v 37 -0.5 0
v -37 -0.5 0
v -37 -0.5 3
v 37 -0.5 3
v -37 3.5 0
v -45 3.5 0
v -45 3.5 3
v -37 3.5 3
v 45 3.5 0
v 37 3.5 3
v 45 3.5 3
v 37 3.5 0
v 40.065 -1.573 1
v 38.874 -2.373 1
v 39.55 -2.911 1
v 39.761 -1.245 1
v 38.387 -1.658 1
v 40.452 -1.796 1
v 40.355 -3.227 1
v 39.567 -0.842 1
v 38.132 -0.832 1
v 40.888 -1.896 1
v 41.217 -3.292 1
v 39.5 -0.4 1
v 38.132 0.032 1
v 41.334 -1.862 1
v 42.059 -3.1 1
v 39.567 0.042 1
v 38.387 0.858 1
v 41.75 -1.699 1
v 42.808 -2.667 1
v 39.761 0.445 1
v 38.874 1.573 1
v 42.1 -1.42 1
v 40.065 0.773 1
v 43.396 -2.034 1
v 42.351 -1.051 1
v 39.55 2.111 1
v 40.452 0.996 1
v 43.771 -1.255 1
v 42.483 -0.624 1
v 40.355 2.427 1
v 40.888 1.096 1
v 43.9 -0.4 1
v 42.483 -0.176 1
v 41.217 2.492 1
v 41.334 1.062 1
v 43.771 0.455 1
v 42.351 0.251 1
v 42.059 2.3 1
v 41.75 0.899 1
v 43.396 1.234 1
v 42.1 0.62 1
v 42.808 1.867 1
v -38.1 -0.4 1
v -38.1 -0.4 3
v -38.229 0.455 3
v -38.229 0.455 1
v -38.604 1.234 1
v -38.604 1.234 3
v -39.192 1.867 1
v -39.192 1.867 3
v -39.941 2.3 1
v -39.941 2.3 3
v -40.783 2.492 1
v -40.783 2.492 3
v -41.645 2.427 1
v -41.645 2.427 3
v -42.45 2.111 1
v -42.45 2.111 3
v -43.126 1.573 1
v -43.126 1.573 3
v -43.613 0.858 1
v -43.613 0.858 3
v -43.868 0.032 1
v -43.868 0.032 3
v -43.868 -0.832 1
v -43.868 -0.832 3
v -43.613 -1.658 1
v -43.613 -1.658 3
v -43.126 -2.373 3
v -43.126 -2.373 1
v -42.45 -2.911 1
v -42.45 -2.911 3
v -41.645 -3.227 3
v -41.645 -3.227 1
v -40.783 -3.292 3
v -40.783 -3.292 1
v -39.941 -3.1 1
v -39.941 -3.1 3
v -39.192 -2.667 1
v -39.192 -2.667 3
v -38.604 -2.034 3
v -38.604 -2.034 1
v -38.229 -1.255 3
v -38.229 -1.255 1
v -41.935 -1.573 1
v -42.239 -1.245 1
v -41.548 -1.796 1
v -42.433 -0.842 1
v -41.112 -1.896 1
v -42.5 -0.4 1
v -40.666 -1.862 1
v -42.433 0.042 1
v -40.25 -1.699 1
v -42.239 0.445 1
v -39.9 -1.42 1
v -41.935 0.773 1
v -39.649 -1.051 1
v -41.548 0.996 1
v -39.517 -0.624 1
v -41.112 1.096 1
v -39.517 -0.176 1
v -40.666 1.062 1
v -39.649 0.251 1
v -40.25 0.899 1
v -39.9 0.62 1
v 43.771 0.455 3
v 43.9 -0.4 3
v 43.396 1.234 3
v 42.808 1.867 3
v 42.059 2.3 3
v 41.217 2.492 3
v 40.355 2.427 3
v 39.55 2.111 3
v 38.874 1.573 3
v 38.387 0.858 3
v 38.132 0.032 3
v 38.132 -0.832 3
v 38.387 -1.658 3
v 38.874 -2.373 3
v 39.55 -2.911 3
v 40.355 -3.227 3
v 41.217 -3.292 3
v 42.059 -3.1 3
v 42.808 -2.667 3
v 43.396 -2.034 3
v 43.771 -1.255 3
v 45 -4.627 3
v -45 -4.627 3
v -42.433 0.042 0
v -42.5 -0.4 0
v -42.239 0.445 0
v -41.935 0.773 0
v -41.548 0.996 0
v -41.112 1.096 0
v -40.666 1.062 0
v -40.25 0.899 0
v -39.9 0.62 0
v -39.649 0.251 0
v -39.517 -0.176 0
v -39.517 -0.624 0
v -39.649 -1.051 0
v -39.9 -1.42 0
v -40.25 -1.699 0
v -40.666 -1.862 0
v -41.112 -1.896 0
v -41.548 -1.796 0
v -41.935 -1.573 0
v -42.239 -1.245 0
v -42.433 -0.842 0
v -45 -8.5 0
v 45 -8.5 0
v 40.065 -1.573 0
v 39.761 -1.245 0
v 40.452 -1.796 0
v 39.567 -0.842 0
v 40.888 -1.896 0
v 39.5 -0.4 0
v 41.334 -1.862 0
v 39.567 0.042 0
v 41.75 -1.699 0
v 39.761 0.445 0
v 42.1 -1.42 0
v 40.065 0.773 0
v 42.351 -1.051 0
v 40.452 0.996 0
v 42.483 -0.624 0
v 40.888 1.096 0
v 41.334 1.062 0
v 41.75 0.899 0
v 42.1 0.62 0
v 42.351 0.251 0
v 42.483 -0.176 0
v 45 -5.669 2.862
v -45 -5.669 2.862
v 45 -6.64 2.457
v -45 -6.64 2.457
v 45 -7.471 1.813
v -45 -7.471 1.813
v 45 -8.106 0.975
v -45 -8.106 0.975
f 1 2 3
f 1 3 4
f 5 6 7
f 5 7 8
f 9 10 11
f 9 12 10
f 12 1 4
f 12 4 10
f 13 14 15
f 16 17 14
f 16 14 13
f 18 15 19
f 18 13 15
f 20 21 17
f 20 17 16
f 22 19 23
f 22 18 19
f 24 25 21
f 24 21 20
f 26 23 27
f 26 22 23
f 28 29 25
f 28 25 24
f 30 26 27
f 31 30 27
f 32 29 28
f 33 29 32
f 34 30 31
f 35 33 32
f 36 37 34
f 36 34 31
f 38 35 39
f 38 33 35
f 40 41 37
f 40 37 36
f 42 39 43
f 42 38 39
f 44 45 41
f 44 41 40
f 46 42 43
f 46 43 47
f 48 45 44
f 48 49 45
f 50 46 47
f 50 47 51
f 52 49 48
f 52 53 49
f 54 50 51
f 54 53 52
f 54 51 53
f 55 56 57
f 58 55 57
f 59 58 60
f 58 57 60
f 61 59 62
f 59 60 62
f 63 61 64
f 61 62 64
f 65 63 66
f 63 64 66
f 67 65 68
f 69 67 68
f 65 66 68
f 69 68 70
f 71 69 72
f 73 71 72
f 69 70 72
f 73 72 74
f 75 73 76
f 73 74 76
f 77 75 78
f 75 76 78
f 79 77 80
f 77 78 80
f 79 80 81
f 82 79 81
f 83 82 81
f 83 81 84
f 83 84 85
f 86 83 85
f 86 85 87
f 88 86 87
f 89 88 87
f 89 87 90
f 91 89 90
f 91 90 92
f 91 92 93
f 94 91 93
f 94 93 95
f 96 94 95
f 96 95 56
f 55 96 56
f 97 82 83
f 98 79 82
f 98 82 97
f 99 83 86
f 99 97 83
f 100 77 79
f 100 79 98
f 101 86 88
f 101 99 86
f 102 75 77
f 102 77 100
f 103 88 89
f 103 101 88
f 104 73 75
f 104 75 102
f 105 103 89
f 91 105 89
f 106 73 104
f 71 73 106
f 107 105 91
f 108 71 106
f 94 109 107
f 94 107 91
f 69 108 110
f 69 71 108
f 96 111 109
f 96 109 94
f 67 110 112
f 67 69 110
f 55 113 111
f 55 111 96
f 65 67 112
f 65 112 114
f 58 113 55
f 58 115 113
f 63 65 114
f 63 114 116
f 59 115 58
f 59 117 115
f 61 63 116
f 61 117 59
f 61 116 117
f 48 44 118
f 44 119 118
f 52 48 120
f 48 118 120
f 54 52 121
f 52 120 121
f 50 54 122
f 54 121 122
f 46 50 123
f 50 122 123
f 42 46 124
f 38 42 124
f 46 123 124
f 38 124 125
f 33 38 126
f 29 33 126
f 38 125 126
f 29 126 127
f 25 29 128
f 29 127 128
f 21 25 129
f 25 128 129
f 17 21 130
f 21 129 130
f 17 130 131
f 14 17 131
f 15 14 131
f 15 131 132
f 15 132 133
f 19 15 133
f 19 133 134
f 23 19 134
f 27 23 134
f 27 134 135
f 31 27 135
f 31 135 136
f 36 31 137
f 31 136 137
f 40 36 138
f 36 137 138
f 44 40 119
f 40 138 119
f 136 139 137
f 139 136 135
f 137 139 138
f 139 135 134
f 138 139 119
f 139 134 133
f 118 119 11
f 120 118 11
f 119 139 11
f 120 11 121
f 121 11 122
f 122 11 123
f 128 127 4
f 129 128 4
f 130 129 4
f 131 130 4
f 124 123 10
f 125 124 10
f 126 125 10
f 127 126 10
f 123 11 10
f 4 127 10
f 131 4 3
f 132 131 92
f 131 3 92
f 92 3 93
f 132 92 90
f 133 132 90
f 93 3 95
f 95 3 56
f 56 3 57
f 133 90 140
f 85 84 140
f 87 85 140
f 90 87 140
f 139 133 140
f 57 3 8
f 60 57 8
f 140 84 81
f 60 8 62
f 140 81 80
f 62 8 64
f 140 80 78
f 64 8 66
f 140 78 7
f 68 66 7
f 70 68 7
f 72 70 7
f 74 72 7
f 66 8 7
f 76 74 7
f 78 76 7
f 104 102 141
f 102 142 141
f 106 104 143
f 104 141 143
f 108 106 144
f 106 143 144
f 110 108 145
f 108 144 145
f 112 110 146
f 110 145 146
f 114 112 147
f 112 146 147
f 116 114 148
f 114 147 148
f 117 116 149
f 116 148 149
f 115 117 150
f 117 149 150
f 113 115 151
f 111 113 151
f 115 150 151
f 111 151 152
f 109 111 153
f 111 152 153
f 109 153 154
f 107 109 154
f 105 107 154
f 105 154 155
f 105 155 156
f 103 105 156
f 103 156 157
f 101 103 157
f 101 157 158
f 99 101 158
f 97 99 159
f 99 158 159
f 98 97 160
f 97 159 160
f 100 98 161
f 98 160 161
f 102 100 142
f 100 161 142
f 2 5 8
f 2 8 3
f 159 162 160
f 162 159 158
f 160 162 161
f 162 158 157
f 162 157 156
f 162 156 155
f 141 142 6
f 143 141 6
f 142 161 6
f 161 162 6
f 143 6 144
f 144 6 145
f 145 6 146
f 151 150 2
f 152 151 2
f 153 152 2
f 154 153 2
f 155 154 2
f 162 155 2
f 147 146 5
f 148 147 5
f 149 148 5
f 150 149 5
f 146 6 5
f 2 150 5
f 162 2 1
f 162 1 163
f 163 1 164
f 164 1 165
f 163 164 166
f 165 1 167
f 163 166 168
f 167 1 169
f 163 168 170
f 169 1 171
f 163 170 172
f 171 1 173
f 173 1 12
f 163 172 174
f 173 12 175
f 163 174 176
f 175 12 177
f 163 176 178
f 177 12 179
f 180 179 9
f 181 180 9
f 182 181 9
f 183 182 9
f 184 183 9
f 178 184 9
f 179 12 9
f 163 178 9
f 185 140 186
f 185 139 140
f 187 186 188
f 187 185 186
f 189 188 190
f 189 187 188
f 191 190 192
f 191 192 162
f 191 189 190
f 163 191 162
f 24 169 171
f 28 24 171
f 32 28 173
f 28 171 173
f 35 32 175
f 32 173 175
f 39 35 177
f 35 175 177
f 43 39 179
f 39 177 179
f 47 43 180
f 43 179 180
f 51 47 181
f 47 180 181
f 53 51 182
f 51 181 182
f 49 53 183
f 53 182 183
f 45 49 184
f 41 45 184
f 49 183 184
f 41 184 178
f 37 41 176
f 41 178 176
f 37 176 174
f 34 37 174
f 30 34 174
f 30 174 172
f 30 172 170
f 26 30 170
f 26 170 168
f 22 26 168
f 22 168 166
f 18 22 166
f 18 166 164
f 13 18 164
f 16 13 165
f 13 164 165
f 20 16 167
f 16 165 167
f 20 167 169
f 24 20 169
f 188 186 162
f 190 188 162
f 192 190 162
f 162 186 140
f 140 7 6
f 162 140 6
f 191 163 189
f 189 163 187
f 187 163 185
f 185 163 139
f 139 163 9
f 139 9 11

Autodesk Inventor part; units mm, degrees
ref_plane "YZ Plane" through (0, 0, 0) normal (1, 0, 0) x (0, 1, 0)
ref_plane "XZ Plane" through (0, 0, 0) normal (0, 1, 0) x (-1, 0, 0)
ref_plane "XY Plane" through (0, 0, 0) normal (0, 0, 1) x (1, 0, 0)
sketch "スケッチ1" plane through (0, 0, 0) normal (0, 0, 1) x (1, 0, 0)
  line L0 (-45, 3.5) -> (45, 3.5)
  line L1 (45, 3.5) -> (45, -3.5)
  line L2 (45, -3.5) -> (-45, -3.5)
  line L3 (-45, -3.5) -> (-45, 3.5)
  line L4 (-45, 3.5) -> (45, -3.5) construction
  line L5 (45, 3.5) -> (-45, -3.5) construction
  point P0 (0, 0)
  dimension "d0" = 90
  dimension "d1" = 7
extrude "押し出し1" add sketch "スケッチ1" along normal blind 3
sketch "スケッチ2" plane through (0, 0, 3) normal (0, 0, 1) x (1, 0, 0)
  circle A0 centre (-41, -0.4) radius 2.9
  circle A1 centre (41, -0.4) radius 2.9
  line L0 (45, 3.5) -> (-45, 3.5) projected
  line L1 (45, -3.5) -> (45, 3.5) projected
  point P0 (0, 0)
  dimension "d4" = 5.8
  dimension "d5" = 5.8
  dimension "d7" = 3.9
  dimension "d8" = 3.9
  dimension "d9" = 82
  dimension "d10" = 4
extrude "押し出し2" cut sketch "スケッチ2" against normal blind 2
sketch "スケッチ3" plane through (0, 0, 0) normal (0, 0, -1) x (-1, 0, 0)
  circle A0 centre (41, -0.4) radius 1.5
  circle A1 centre (-41, -0.4) radius 1.5
  line L0 (45, -3.5) -> (45, 3.5) projected
  line L1 (-45, 3.5) -> (-45, -3.5) projected
  line L2 (45, 3.5) -> (-45, 3.5) projected
  point P0 (0, 0)
  dimension "d13" = 3
  dimension "d14" = 3
  dimension "d15" = 4
  dimension "d16" = 4
  dimension "d17" = 3.9
  dimension "d18" = 3.9
extrude "押し出し3" cut sketch "スケッチ3" against normal blind 2
sketch "スケッチ4" plane through (-45, -3.5, 0) normal (0, -1, 0) x (1, 0, 0)
  line L0 (0, 0) -> (90, 0)
  line L1 (90, 0) -> (90, 3)
  line L2 (90, 3) -> (0, 3)
  line L3 (0, 3) -> (0, 0)
  point P0 (45, 0)
extrude "押し出し4" add sketch "スケッチ4" along normal blind 5
fillet "フィレット1" radius 4 1 edges at (0, -8.5, 3)
sketch "スケッチ6" plane through (0, 0, 0) normal (0, 0, -1) x (-1, 0, 0)
  line L0 (37, -0.5) -> (-37, -0.5)
  line L1 (-37, -0.5) -> (-37, 3.5)
  line L2 (-37, 3.5) -> (37, 3.5)
  line L3 (37, 3.5) -> (37, -0.5)
  line L4 (45, -8.5) -> (45, 3.5) projected
  line L5 (45, 3.5) -> (-45, 3.5) projected
  point P0 (0, 0)
  dimension "d24" = 74
  dimension "d25" = 8
  dimension "d26" = 0
  dimension "d27" = 4
extrude "押し出し5" cut sketch "スケッチ6" against normal blind 10
properties part number "LineTraceCover"
